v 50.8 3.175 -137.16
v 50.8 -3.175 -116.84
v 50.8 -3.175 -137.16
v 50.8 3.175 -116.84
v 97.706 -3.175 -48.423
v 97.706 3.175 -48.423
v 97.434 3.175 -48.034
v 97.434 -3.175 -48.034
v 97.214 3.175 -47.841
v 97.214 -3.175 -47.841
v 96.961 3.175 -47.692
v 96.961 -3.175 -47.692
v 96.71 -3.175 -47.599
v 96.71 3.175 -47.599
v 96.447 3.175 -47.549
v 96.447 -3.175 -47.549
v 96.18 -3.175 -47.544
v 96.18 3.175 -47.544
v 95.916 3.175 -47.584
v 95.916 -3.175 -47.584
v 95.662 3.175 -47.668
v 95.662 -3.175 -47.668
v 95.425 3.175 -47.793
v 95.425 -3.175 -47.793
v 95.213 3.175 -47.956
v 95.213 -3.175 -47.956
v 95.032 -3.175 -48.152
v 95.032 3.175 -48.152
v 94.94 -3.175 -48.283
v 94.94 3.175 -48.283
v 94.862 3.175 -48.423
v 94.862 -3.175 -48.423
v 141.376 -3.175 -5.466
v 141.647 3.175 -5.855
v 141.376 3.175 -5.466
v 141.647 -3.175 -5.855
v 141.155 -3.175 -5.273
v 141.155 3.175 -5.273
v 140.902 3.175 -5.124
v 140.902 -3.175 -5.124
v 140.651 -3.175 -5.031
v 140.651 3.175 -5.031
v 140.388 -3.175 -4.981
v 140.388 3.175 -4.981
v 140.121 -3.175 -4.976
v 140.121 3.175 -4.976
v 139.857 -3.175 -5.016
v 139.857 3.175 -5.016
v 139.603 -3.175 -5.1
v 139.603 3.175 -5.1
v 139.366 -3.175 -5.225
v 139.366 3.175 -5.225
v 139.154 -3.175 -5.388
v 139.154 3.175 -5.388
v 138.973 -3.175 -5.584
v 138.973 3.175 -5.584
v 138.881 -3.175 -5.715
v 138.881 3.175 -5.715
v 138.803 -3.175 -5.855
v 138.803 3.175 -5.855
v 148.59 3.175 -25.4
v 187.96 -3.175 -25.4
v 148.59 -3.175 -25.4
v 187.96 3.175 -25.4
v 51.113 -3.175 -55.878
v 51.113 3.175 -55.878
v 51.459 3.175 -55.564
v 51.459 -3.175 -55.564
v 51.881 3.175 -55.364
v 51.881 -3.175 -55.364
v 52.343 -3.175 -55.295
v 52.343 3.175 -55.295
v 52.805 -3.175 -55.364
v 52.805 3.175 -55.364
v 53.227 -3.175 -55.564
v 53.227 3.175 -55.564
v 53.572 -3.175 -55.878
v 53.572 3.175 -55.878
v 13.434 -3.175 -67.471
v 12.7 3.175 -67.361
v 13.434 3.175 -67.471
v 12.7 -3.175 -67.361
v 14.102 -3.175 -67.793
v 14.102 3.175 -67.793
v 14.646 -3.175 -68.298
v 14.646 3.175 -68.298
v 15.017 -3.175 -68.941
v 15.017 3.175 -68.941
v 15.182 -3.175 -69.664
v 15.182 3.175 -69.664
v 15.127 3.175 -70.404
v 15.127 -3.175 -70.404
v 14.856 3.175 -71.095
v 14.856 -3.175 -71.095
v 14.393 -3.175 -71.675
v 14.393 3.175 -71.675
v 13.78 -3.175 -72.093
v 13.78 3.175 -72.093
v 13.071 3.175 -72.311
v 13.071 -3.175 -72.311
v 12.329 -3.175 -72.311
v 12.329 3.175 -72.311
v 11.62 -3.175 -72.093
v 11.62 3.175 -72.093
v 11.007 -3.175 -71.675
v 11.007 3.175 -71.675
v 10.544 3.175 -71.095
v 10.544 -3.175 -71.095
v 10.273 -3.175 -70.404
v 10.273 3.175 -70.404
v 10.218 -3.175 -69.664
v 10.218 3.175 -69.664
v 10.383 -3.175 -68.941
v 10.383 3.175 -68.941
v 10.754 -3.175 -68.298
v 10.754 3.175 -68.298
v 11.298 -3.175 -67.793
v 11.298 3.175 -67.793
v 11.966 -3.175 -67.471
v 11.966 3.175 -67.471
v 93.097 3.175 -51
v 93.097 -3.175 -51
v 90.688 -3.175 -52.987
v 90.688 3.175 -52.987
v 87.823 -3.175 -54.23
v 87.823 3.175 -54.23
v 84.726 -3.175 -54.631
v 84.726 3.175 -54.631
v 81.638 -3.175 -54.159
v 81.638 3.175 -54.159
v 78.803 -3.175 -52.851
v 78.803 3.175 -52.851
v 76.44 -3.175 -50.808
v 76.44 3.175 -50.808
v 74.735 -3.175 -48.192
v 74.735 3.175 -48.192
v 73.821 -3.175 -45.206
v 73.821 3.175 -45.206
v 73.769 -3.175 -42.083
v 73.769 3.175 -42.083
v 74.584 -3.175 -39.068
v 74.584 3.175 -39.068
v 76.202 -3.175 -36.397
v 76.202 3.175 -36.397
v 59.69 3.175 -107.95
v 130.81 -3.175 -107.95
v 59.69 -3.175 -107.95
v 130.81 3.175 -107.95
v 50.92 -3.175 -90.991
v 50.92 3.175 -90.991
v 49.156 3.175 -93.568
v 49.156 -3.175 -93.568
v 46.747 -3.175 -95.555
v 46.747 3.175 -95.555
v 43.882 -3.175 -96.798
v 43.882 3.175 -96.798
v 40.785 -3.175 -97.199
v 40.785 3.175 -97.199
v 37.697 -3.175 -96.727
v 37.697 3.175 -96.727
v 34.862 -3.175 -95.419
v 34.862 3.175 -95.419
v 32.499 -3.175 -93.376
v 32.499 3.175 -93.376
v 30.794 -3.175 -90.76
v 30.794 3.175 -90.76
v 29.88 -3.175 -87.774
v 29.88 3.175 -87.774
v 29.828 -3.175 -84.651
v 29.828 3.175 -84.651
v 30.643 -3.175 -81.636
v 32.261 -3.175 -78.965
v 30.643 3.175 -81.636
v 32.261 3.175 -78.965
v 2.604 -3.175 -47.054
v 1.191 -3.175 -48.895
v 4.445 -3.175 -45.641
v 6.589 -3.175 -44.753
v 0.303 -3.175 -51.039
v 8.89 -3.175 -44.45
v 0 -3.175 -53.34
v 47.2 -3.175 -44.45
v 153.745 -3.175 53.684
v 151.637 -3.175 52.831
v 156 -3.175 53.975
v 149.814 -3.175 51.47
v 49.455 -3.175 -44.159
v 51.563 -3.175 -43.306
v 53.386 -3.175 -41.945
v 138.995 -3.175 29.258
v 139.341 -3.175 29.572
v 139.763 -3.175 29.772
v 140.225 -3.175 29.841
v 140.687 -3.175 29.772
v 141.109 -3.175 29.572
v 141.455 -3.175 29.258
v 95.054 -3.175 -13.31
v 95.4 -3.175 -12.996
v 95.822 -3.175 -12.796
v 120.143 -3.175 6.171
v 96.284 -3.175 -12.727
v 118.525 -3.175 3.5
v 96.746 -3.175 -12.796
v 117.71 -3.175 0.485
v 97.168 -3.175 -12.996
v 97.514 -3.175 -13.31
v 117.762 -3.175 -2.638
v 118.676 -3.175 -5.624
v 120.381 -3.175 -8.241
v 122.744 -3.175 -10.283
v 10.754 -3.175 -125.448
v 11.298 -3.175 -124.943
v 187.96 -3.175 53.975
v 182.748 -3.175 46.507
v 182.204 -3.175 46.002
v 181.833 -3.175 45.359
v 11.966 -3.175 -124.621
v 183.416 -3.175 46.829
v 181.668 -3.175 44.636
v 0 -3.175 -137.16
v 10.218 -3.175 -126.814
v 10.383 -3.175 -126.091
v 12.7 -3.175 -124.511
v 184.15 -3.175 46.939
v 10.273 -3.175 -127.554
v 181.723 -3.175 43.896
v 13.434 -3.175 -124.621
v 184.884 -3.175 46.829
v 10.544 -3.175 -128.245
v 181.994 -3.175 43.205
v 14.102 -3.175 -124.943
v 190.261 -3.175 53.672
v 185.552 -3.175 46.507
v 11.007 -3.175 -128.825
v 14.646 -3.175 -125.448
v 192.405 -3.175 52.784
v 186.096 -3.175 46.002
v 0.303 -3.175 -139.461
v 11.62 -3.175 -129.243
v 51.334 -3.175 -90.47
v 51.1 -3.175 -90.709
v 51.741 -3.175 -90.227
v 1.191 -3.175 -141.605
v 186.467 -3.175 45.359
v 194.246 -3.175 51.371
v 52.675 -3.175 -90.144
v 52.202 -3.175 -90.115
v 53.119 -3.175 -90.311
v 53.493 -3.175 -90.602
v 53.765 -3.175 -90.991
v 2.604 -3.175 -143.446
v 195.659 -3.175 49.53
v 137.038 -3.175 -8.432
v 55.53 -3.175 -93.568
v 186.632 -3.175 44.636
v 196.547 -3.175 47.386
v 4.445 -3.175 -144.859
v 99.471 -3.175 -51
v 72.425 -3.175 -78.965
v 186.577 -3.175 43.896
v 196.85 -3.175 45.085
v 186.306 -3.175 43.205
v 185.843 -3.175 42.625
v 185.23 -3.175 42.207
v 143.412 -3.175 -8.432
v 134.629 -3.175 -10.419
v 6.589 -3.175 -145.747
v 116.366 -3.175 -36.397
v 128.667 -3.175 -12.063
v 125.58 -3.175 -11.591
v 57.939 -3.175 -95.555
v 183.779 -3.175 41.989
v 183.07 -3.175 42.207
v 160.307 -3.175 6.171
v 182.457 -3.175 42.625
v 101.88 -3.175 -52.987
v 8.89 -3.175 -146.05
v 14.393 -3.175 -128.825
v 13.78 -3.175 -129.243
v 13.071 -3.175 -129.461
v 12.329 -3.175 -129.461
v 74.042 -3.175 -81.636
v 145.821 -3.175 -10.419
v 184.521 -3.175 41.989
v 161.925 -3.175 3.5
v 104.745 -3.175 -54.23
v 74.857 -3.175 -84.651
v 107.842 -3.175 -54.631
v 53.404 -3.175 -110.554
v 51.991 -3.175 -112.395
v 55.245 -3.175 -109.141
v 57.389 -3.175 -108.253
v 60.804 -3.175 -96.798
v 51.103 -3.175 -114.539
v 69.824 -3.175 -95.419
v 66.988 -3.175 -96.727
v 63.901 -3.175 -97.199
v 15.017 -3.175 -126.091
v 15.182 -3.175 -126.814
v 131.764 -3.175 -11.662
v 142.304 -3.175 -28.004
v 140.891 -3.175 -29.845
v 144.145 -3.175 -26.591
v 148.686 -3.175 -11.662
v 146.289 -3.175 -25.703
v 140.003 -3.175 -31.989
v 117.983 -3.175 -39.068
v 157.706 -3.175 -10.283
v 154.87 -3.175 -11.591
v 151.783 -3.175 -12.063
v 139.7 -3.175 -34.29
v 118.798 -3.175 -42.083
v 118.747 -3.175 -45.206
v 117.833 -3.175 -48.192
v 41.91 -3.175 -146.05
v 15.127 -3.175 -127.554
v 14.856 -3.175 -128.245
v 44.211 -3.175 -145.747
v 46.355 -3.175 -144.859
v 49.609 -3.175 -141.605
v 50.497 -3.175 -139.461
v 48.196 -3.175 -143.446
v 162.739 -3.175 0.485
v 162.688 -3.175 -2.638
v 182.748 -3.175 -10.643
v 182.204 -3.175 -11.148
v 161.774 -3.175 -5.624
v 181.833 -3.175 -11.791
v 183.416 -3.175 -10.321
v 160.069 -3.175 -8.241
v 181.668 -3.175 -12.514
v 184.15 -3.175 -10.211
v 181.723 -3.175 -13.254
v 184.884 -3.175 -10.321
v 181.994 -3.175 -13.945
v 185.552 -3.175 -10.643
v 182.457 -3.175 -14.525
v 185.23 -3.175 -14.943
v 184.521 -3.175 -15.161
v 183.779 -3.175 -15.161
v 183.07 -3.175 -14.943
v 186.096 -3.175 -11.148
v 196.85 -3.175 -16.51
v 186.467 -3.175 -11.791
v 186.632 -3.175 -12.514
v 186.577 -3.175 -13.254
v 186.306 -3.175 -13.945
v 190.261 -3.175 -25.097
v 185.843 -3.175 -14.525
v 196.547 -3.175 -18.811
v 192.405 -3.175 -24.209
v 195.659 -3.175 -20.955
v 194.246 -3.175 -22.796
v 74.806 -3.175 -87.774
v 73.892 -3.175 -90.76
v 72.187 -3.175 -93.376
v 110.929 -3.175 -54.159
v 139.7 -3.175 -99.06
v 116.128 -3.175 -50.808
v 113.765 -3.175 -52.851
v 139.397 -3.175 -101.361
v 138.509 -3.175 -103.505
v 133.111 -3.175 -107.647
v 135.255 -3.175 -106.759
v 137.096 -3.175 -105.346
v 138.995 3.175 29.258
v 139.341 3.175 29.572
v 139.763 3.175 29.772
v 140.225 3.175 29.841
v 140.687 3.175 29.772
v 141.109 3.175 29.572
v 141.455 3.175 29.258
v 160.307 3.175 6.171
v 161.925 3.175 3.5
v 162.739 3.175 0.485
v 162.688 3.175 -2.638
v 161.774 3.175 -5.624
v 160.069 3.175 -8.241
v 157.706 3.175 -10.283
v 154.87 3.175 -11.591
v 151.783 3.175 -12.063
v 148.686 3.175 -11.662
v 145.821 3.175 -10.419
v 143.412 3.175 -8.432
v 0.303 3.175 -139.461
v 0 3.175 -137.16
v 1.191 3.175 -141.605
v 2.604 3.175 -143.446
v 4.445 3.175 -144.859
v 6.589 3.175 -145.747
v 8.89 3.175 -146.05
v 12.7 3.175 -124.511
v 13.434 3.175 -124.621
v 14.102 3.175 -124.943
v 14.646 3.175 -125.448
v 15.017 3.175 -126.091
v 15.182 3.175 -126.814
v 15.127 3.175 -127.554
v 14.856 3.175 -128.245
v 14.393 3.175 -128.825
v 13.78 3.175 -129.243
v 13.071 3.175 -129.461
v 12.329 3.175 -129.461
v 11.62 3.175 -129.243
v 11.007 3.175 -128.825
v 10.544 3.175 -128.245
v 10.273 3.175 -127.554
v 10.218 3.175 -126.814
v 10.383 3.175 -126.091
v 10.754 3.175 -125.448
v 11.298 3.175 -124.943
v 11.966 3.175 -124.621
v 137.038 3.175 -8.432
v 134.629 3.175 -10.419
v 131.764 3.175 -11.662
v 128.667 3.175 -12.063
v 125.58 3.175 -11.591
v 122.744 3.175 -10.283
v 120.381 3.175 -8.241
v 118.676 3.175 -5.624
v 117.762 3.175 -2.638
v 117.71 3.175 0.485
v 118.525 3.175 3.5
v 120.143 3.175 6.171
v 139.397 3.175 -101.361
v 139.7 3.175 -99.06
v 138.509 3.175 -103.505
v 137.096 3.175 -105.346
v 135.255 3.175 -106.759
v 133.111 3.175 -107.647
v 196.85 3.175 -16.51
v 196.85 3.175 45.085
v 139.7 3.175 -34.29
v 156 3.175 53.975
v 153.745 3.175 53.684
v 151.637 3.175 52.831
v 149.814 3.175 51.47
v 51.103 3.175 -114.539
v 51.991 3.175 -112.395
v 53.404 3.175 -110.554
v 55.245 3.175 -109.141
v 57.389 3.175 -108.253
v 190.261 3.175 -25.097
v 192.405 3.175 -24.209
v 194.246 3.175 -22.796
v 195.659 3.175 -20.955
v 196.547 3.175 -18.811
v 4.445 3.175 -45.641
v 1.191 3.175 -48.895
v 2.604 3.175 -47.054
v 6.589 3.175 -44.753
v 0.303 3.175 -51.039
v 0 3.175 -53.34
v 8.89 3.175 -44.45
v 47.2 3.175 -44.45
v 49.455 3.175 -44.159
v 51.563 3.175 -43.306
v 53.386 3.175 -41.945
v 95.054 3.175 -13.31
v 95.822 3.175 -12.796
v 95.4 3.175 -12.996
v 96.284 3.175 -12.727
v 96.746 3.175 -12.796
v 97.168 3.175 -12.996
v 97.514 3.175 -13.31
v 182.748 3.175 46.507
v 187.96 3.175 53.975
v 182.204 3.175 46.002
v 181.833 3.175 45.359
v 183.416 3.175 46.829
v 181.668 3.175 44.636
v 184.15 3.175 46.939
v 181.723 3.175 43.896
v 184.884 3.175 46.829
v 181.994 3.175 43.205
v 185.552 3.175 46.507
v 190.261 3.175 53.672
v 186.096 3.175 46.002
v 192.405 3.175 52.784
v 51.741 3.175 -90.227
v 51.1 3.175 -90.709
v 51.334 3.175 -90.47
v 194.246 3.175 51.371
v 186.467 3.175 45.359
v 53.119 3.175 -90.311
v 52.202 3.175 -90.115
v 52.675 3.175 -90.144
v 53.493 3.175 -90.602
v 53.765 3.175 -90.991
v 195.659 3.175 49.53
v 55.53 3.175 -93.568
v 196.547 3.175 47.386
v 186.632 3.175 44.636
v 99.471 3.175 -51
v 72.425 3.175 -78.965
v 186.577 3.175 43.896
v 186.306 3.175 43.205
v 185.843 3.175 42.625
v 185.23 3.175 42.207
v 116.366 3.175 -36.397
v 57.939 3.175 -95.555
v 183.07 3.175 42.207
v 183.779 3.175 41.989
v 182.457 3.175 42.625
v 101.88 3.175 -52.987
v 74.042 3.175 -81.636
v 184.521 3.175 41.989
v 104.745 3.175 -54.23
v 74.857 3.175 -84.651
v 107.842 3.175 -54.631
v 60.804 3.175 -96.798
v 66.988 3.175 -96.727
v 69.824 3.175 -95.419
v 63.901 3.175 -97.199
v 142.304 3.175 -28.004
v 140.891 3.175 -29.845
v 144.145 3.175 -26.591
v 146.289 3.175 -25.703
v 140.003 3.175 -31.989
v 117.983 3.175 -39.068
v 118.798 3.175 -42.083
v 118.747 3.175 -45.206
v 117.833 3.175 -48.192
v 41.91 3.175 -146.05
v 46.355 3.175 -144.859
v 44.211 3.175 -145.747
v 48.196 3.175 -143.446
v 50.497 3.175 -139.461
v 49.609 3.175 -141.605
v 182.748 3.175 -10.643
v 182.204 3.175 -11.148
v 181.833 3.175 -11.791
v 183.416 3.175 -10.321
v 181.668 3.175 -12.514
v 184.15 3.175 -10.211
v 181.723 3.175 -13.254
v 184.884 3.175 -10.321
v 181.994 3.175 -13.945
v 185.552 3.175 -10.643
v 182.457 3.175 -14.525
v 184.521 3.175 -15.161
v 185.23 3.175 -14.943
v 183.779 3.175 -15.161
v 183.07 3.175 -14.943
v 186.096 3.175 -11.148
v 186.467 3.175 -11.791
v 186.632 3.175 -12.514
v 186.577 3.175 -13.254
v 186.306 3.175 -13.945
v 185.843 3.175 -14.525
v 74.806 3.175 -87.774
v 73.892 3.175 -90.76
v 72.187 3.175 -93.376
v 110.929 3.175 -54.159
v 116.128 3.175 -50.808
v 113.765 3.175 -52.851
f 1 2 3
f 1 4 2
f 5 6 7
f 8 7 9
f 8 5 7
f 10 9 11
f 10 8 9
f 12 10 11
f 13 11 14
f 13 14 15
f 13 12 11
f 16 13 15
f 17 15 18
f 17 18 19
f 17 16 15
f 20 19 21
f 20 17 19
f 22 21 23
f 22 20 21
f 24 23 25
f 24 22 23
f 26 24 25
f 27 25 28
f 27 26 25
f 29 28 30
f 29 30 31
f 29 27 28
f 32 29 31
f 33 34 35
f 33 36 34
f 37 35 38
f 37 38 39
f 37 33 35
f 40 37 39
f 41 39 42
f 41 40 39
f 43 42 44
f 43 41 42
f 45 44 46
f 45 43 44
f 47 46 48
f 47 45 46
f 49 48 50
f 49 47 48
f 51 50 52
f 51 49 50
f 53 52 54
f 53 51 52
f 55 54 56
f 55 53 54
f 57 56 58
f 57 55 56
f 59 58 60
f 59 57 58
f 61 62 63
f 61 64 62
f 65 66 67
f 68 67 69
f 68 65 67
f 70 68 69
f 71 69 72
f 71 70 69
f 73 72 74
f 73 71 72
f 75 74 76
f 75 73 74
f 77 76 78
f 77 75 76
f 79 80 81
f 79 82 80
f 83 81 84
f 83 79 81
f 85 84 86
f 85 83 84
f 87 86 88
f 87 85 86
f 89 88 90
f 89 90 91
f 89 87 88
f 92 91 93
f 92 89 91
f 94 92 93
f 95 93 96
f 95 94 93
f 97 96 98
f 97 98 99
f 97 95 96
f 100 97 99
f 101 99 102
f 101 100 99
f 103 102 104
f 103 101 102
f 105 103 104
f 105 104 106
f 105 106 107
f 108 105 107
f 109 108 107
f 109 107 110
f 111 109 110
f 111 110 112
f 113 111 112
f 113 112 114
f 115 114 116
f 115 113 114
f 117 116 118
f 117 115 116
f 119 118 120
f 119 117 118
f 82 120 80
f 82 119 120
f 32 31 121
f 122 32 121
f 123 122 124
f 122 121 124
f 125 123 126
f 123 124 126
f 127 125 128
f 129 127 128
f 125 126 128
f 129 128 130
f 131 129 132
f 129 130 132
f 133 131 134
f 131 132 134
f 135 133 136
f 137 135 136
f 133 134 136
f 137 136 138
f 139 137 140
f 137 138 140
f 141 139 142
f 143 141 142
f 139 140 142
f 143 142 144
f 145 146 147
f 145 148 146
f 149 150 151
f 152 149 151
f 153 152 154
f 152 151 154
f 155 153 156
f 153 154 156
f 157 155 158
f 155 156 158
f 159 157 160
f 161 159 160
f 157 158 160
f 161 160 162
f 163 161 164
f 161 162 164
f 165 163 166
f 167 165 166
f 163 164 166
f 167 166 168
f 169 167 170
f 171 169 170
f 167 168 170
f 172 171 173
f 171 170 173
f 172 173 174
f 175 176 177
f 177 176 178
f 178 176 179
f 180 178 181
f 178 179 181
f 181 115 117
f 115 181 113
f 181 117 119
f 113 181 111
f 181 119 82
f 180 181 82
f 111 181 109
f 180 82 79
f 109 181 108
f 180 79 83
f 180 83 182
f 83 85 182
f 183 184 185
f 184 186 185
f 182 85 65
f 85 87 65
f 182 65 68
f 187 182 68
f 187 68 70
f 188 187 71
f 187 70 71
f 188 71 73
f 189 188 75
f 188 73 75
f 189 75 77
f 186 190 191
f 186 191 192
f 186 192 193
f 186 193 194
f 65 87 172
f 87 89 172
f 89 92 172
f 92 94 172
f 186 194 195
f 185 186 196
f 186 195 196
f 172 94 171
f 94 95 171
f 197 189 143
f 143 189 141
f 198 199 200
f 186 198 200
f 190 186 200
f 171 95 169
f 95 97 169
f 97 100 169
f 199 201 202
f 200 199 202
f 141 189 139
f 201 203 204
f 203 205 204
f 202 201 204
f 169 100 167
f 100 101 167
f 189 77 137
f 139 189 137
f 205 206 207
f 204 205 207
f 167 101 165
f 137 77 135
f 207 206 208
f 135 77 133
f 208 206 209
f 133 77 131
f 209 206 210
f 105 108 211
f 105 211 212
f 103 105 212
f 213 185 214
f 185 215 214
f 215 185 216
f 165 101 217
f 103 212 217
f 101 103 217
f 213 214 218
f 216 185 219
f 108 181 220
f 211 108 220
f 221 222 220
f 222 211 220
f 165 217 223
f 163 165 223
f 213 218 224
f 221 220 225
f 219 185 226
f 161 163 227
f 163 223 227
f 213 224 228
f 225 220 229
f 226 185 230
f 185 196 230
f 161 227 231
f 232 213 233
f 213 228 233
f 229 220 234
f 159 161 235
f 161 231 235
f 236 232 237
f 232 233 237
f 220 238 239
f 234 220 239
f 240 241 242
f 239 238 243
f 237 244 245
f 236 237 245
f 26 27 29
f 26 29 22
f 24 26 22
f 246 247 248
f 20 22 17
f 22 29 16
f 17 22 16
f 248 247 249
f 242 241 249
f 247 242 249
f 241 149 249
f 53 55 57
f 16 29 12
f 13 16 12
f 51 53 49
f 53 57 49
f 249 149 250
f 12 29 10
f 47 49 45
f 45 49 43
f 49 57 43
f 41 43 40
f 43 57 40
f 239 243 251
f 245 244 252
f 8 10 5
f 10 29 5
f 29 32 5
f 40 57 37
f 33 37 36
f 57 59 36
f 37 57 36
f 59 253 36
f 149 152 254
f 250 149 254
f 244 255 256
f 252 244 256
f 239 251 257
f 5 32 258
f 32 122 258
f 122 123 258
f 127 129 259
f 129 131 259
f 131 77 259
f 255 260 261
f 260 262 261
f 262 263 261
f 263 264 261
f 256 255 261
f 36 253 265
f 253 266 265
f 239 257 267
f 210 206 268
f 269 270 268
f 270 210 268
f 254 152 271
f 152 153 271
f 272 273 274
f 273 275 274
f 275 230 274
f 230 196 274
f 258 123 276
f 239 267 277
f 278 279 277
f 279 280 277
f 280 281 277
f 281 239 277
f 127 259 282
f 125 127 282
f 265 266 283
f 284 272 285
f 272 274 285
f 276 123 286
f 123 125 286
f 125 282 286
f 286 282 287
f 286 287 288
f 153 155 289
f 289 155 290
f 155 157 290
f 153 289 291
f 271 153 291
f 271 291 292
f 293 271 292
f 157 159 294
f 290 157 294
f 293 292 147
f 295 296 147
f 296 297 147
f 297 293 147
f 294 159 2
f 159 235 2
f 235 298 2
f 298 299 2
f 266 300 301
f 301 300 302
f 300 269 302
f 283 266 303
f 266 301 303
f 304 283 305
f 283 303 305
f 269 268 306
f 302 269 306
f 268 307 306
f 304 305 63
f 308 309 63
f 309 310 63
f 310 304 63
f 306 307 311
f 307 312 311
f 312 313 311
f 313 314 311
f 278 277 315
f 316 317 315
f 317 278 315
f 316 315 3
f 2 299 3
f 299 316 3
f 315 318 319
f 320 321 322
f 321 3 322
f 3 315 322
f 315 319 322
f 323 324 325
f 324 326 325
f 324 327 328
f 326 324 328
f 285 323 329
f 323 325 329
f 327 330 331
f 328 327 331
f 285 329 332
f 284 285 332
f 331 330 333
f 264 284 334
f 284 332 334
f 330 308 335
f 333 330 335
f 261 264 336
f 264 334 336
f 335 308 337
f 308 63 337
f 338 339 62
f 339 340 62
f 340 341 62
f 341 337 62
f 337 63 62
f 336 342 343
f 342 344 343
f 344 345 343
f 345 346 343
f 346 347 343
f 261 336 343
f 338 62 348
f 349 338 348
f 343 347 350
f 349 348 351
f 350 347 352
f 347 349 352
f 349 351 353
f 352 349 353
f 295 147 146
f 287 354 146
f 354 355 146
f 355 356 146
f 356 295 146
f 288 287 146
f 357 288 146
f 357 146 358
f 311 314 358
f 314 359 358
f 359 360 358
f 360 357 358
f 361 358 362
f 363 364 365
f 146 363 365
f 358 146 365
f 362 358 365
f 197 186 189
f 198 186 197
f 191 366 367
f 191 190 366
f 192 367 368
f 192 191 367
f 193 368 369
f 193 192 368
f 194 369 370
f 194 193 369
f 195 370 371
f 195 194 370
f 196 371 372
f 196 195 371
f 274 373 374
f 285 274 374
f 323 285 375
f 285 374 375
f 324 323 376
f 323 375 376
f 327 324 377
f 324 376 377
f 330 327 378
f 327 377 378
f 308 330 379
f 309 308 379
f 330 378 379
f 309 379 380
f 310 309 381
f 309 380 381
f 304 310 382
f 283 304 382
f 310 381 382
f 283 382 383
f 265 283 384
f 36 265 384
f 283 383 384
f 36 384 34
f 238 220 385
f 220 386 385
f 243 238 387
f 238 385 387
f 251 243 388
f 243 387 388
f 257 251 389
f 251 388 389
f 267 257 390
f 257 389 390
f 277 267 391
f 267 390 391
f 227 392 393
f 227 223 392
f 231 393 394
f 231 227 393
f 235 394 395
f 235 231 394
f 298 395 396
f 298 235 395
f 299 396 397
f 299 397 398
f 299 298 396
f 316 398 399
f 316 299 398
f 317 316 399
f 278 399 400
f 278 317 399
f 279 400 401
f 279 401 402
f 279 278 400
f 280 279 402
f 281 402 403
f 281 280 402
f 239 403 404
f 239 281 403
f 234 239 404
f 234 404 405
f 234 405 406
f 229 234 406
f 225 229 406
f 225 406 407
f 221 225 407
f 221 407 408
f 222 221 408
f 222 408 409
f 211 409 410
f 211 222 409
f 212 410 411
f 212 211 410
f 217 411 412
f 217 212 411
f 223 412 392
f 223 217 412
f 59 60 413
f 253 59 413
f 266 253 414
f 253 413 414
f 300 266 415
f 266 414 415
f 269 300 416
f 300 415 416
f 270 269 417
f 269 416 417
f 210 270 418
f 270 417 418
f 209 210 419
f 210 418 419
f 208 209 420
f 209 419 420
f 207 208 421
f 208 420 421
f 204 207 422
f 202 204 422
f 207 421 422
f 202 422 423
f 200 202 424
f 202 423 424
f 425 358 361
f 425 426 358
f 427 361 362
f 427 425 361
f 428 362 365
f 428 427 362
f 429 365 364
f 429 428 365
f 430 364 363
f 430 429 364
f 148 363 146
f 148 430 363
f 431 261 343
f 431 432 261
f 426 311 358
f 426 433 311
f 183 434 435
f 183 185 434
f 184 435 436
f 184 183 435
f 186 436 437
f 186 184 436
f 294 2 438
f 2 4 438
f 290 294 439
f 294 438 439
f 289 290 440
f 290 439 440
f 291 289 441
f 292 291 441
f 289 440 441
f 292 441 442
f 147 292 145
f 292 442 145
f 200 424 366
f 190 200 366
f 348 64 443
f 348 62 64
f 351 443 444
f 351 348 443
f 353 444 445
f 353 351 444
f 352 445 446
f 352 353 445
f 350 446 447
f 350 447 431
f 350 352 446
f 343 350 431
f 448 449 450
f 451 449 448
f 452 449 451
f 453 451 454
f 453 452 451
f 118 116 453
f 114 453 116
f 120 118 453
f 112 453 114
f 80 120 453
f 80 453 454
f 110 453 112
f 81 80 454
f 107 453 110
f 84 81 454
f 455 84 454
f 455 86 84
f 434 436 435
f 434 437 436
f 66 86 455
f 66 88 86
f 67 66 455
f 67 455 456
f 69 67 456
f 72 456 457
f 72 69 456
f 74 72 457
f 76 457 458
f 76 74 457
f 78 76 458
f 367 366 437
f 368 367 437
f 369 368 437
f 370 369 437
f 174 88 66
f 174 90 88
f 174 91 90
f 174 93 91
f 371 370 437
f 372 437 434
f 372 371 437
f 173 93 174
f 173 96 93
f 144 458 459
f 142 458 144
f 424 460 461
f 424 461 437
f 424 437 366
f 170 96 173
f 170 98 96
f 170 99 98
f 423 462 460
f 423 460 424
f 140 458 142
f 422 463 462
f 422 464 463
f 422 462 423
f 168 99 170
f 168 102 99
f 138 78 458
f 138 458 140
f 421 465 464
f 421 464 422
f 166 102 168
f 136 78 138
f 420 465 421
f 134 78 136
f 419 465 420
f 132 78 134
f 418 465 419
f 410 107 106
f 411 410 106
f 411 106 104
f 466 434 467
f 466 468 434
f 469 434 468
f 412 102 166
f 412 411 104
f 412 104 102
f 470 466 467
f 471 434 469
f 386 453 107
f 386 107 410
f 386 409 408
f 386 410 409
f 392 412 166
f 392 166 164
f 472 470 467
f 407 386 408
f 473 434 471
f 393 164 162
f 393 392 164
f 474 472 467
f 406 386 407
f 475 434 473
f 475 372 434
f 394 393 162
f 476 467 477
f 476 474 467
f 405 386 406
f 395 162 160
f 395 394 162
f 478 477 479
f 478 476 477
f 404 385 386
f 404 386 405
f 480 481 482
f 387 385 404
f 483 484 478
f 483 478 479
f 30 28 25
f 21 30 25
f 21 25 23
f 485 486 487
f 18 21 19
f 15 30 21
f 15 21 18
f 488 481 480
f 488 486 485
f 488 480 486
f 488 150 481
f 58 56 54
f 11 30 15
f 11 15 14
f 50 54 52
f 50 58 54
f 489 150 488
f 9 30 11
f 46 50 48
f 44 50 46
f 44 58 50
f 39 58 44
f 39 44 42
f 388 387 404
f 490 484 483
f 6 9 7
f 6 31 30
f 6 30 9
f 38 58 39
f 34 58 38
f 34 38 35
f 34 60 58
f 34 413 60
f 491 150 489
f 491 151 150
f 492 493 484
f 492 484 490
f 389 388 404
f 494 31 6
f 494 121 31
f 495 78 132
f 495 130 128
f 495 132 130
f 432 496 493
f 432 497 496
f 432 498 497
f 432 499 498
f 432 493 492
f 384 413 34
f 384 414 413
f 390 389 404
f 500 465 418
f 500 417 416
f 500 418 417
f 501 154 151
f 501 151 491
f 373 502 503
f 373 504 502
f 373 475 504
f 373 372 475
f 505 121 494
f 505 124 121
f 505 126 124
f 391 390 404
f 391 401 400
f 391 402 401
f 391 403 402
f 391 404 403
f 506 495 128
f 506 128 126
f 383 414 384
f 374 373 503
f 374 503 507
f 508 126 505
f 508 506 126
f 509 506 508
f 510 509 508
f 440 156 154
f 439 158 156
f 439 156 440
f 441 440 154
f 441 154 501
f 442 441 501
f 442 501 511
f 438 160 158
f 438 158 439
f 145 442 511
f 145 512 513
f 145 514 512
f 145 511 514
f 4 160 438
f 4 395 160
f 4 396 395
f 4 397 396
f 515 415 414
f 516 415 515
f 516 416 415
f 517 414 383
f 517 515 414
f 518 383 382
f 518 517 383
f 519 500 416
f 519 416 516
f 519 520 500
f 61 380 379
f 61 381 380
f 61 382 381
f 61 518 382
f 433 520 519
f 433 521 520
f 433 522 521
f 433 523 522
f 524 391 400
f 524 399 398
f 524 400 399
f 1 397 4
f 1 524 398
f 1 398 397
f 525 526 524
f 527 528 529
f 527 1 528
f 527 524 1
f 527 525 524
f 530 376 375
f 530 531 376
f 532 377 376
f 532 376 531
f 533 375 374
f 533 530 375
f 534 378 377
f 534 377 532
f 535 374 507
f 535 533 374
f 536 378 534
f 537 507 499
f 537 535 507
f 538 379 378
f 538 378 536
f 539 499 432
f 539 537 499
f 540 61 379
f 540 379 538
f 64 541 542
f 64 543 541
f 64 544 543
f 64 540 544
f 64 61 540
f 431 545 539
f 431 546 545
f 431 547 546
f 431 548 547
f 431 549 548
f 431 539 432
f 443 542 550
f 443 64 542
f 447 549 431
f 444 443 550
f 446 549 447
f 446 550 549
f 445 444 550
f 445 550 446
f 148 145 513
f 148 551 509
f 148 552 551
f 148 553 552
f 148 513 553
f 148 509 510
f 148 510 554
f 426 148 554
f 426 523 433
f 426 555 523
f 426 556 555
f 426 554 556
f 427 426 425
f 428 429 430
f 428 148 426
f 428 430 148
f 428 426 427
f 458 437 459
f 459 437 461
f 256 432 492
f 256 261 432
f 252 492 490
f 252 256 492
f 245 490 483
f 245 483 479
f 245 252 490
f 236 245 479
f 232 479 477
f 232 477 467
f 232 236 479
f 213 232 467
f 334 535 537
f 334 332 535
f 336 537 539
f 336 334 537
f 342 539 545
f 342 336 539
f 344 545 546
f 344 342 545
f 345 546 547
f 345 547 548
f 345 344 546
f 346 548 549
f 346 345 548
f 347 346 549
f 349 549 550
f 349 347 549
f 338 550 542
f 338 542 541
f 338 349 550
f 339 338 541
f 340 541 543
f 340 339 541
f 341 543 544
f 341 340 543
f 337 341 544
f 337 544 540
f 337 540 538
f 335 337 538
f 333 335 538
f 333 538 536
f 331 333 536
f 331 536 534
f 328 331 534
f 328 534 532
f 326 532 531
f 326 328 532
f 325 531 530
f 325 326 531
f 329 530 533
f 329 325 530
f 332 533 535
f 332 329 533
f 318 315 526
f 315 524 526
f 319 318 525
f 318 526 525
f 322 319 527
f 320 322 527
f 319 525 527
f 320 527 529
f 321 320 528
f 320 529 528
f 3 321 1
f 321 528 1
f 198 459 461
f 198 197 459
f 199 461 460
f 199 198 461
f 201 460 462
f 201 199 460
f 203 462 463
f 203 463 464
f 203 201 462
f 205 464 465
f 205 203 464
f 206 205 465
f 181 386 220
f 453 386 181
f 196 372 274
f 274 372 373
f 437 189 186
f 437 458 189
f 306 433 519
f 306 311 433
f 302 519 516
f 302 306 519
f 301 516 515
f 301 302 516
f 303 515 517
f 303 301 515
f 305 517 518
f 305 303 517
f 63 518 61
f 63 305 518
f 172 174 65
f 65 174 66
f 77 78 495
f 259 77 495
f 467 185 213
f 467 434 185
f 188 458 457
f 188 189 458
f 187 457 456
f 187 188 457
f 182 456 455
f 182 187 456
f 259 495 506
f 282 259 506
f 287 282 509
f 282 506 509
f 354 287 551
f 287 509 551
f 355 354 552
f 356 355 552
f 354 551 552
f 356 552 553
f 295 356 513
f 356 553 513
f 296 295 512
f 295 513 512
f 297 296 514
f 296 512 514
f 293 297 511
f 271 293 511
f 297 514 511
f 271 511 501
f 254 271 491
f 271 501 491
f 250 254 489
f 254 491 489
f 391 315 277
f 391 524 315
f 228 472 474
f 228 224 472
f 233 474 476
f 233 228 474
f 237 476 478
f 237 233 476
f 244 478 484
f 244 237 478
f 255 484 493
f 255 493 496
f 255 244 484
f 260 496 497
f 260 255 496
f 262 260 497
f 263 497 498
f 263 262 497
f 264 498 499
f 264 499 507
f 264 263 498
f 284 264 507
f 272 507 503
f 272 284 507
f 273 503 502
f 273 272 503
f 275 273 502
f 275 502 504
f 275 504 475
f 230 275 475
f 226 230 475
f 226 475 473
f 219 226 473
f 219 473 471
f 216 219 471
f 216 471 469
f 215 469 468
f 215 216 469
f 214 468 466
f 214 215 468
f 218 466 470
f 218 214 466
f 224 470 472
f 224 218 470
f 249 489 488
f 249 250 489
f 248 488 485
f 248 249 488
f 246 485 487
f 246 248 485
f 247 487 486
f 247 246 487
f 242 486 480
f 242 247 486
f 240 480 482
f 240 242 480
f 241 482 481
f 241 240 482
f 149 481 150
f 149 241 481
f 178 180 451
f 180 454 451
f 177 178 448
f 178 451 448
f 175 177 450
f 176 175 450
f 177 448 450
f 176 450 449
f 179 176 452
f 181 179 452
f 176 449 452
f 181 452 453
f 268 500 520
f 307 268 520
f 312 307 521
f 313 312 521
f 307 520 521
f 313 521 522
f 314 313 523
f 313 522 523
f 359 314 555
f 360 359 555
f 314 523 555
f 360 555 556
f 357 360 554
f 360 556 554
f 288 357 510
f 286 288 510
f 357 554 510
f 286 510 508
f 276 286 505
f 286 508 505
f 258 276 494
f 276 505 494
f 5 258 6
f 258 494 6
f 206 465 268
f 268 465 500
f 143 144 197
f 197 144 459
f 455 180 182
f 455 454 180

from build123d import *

# Parameters (mm, degrees)
SKETCH1_R           = 2.4892
BOSS_EXTRUDE1_DEPTH = 3.175
FILLET2_R           = 8.89
CUT_EXTRUDE2_DEPTH  = 246.195529119
FILLET3_R           = 1.5875


with BuildPart() as part:
    # Sketch1 → Boss-Extrude1 (new, symmetric)
    with BuildSketch(Plane(origin=(0, 0, 0), x_dir=(1, 0, 0), z_dir=(0, 1, 0))):
        Polygon((139.7, 25.4), (139.7, 107.95), (50.8, 107.95), (50.8, 146.05), (0, 146.05), (0, 107.95), (0, 44.45), (50.8, 44.45), (152.4, -53.975), (196.85, -53.975), (196.85, 0), (196.85, 25.4), align=None)
        with Locations(Location((184.15, -44.45, 0), (0, 0, 270))):
            Circle(SKETCH1_R, mode=Mode.SUBTRACT)
        with Locations(Location((184.15, 12.7, 0), (0, 0, 270))):
            Circle(SKETCH1_R, mode=Mode.SUBTRACT)
        with Locations(Location((12.7, 69.85, 0), (0, 0, 270))):
            Circle(SKETCH1_R, mode=Mode.SUBTRACT)
        with Locations(Location((12.7, 127, 0), (0, 0, 270))):
            Circle(SKETCH1_R, mode=Mode.SUBTRACT)
    extrude(amount=BOSS_EXTRUDE1_DEPTH, both=True)

    # Fillet2
    fillet2_edges = [part.edges().sort_by_distance(p)[0] for p in [
        (50.8, 0, -107.95),
        (139.7, 0, -107.95),
        (139.7, 0, -25.4),
        (196.85, 0, -25.4),
        (196.85, 0, 53.975),
        (152.4, 0, 53.975),
        (50.8, 0, -44.45),
        (0, 0, -44.45),
        (0, 0, -146.05),
        (50.8, 0, -146.05),
    ]]
    fillet(fillet2_edges, radius=FILLET2_R)

    # Sketch4 → Cut-Extrude2 (cut, through all)
    with BuildSketch(Plane(origin=(0, 3.175, 0), x_dir=(1, 0, 0), z_dir=(0, 1, 0))):
        with BuildLine():
            Line((32.261000835, 78.9647419), (52.342813318, 54.372399446))
            Line((52.342813318, 54.372399446), (72.424625802, 78.9647419))
            ThreePointArc((72.424625802, 78.9647419), (69.796699914, 95.436110561), (53.736462526, 90.93269463))
            Line((53.736462526, 90.93269463), (52.342813318, 88.079912324))
            Line((52.342813318, 88.079912324), (50.949164111, 90.93269463))
            ThreePointArc((50.949164111, 90.93269463), (34.888926723, 95.436110561), (32.261000835, 78.9647419))
        make_face()
        with BuildLine():
            Line((76.202071803, 36.3968294), (96.283884286, 11.804486946))
            Line((96.283884286, 11.804486946), (116.365696769, 36.3968294))
            ThreePointArc((116.365696769, 36.3968294), (113.737770882, 52.868198061), (97.677533493, 48.36478213))
            Line((97.677533493, 48.36478213), (96.283884286, 45.511999824))
            Line((96.283884286, 45.511999824), (94.890235079, 48.36478213))
            ThreePointArc((94.890235079, 48.36478213), (78.82999769, 52.868198061), (76.202071803, 36.3968294))
        make_face()
        with BuildLine():
            Line((120.14314277, -6.171083099), (140.224955253, -30.763425554))
            Line((140.224955253, -30.763425554), (160.306767736, -6.171083099))
            ThreePointArc((160.306767736, -6.171083099), (157.678841849, 10.300285561), (141.618604461, 5.796869631))
            Line((141.618604461, 5.796869631), (140.224955253, 2.944087324))
            Line((140.224955253, 2.944087324), (138.831306046, 5.796869631))
            ThreePointArc((138.831306046, 5.796869631), (122.771068658, 10.300285561), (120.14314277, -6.171083099))
        make_face()
    extrude(amount=-CUT_EXTRUDE2_DEPTH, mode=Mode.SUBTRACT)

    # Fillet3
    fillet3_edges = [part.edges().sort_by_distance(p)[0] for p in [
        (52.342813318, 0, -88.079912324),
        (52.342813318, 0, -54.372399446),
        (140.224955253, 0, -2.944087324),
        (140.224955253, 0, 30.763425554),
        (96.283884286, 0, -11.804486946),
        (96.283884286, 0, -45.511999824),
    ]]
    fillet(fillet3_edges, radius=FILLET3_R)


solid = part.part
